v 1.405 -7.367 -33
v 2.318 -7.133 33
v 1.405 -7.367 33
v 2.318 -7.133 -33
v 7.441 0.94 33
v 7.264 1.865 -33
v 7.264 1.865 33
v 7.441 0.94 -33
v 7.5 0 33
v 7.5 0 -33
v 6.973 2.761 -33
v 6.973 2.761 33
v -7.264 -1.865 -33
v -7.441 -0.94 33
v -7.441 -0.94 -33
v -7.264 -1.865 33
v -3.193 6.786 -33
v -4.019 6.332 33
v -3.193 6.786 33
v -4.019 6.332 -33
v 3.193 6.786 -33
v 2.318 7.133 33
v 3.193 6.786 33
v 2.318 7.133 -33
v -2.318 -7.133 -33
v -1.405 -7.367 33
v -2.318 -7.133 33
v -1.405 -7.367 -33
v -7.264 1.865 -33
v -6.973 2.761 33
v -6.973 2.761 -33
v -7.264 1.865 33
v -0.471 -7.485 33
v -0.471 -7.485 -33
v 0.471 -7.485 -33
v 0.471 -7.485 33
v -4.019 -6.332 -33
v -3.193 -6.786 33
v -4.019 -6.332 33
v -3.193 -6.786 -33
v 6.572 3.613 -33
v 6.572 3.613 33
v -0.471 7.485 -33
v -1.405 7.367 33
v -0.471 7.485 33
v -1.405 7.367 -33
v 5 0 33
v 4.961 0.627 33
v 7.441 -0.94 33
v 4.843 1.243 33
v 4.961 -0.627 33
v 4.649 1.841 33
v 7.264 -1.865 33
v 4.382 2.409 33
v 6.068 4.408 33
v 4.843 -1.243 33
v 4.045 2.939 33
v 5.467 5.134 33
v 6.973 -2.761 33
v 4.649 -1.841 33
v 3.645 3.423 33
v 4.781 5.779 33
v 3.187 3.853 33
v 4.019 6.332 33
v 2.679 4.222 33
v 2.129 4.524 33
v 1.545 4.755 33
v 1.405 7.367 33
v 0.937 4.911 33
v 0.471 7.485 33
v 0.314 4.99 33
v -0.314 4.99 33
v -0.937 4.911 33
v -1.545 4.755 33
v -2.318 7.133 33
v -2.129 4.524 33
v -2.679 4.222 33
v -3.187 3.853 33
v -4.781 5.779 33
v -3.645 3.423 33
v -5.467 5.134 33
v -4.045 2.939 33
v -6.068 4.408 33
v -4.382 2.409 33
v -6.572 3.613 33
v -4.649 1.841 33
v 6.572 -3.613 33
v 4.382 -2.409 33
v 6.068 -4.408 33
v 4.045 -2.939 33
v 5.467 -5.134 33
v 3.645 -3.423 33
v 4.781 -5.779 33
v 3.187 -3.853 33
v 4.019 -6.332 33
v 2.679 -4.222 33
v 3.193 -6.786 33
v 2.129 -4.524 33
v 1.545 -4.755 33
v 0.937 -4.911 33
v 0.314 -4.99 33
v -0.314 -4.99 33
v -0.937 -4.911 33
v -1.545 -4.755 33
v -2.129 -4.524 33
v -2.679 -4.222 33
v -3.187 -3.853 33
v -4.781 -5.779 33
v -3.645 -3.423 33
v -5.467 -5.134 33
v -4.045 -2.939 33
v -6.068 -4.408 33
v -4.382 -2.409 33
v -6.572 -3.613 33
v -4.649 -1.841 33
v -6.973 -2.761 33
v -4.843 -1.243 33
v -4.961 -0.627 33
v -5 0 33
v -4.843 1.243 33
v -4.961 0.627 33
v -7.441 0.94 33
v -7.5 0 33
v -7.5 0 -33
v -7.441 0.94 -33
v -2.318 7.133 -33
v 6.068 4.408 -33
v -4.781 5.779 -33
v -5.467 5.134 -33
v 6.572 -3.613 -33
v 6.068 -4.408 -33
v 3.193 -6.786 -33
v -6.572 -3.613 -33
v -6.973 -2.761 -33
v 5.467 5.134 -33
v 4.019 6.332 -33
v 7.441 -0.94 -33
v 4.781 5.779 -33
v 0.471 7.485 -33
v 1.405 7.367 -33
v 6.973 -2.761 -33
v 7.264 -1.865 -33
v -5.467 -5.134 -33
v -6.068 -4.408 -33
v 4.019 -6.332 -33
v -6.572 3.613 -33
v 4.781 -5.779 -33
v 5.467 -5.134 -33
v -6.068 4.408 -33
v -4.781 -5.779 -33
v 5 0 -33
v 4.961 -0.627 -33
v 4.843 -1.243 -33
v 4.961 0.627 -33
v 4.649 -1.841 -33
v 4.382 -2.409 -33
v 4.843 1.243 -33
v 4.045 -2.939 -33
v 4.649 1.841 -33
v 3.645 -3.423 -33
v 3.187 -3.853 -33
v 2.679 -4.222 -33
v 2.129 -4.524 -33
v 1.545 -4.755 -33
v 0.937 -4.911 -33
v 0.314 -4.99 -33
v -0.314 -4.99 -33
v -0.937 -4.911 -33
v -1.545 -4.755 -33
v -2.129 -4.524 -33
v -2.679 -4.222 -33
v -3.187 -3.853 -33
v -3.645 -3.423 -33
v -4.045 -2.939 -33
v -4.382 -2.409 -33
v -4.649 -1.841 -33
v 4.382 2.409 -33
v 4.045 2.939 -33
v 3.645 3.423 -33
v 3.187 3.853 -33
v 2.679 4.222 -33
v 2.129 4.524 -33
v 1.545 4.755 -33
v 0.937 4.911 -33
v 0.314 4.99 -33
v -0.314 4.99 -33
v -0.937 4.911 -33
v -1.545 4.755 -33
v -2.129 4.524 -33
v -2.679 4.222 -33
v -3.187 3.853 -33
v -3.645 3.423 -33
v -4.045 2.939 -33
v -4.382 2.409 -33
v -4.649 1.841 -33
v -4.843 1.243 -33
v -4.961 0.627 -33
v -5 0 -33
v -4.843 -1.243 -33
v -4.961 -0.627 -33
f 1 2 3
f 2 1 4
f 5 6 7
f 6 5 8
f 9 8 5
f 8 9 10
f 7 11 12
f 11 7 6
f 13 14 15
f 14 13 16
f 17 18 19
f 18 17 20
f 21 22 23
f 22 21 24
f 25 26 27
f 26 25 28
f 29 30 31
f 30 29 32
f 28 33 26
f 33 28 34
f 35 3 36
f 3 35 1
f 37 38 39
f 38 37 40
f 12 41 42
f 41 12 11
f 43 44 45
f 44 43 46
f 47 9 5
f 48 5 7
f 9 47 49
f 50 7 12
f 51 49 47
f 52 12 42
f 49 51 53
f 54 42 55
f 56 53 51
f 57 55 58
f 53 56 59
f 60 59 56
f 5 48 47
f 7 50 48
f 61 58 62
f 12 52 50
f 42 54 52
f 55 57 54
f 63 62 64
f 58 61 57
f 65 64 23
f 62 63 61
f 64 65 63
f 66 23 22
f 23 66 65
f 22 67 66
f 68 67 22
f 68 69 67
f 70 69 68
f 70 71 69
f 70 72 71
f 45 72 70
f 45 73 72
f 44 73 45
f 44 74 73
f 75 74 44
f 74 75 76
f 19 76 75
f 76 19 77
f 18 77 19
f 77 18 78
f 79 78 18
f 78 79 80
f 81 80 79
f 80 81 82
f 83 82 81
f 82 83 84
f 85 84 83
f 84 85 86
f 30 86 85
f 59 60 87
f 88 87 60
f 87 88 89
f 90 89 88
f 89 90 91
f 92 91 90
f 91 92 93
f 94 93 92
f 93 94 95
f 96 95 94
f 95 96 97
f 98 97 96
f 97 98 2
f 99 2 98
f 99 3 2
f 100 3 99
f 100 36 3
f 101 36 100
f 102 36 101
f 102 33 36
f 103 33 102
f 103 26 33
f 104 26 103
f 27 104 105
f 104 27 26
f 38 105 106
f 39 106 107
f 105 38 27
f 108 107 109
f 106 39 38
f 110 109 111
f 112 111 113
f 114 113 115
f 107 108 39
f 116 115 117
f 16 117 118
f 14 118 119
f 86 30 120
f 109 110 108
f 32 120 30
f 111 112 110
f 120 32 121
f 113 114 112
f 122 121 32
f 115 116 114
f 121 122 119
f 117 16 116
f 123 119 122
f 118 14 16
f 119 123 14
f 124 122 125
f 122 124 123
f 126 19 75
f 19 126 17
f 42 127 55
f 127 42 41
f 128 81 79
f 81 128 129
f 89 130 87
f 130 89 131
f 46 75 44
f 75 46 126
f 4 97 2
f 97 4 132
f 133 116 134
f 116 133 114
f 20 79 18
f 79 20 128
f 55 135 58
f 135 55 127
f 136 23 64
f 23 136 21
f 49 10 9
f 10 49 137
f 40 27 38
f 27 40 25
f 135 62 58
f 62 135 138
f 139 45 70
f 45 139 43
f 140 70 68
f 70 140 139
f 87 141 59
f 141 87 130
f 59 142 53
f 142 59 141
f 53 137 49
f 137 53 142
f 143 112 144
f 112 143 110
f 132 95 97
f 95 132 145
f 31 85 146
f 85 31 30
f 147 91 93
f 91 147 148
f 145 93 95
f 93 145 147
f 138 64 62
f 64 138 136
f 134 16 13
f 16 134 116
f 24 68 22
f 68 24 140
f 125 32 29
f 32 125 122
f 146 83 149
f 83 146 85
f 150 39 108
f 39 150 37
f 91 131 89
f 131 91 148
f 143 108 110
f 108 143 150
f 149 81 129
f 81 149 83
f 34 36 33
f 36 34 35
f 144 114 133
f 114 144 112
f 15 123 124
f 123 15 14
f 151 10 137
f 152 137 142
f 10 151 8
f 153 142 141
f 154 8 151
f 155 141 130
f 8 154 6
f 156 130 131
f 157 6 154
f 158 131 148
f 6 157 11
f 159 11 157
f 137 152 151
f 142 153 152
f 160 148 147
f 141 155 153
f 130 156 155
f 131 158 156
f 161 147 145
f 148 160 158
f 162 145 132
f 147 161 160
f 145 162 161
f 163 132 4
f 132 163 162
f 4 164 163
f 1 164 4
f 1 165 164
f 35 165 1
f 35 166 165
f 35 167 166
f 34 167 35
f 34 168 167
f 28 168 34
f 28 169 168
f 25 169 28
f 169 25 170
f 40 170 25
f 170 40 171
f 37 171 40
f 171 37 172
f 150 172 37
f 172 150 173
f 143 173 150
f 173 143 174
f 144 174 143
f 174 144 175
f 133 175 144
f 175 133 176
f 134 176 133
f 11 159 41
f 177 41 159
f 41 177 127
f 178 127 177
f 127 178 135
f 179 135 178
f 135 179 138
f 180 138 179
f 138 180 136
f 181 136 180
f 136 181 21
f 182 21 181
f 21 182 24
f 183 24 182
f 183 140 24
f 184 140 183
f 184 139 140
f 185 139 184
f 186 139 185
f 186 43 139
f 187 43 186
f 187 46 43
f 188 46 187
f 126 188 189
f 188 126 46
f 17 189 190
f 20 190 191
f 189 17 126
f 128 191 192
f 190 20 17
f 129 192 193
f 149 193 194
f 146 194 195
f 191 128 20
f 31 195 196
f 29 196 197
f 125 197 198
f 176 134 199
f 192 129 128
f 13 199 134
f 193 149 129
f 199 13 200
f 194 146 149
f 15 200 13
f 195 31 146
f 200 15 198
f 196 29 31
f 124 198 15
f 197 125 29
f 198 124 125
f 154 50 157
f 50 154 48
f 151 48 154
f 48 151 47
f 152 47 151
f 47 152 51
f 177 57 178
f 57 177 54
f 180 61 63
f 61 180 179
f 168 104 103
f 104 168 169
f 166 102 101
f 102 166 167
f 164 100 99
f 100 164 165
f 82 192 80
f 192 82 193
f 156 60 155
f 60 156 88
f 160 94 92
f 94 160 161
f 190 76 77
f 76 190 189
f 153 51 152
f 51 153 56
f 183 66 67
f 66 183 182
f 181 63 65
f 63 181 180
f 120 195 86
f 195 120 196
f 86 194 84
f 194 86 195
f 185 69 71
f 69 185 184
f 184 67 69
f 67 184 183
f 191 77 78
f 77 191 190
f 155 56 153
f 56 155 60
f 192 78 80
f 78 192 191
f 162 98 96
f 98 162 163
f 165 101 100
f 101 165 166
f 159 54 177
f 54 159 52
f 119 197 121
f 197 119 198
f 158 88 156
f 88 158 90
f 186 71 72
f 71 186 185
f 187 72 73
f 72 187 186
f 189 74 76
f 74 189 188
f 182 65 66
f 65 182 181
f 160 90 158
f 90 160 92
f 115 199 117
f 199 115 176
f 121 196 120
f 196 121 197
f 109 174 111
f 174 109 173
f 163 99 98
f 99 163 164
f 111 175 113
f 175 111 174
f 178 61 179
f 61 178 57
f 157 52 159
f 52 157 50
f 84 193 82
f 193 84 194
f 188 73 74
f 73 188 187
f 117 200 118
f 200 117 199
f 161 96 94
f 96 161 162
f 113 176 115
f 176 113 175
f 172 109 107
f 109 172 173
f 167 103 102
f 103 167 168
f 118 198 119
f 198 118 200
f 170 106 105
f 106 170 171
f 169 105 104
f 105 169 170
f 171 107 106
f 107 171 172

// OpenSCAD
$fn = 50;


difference() {
	union() {
		translate(v = [0, 0, -33.0000000000]) {
			cylinder(h = 66, r = 7.5000000000);
		}
	}
	union() {
		translate(v = [0, 0, -100.0000000000]) {
			cylinder(h = 200, r = 5.0000000000);
		}
	}
}
